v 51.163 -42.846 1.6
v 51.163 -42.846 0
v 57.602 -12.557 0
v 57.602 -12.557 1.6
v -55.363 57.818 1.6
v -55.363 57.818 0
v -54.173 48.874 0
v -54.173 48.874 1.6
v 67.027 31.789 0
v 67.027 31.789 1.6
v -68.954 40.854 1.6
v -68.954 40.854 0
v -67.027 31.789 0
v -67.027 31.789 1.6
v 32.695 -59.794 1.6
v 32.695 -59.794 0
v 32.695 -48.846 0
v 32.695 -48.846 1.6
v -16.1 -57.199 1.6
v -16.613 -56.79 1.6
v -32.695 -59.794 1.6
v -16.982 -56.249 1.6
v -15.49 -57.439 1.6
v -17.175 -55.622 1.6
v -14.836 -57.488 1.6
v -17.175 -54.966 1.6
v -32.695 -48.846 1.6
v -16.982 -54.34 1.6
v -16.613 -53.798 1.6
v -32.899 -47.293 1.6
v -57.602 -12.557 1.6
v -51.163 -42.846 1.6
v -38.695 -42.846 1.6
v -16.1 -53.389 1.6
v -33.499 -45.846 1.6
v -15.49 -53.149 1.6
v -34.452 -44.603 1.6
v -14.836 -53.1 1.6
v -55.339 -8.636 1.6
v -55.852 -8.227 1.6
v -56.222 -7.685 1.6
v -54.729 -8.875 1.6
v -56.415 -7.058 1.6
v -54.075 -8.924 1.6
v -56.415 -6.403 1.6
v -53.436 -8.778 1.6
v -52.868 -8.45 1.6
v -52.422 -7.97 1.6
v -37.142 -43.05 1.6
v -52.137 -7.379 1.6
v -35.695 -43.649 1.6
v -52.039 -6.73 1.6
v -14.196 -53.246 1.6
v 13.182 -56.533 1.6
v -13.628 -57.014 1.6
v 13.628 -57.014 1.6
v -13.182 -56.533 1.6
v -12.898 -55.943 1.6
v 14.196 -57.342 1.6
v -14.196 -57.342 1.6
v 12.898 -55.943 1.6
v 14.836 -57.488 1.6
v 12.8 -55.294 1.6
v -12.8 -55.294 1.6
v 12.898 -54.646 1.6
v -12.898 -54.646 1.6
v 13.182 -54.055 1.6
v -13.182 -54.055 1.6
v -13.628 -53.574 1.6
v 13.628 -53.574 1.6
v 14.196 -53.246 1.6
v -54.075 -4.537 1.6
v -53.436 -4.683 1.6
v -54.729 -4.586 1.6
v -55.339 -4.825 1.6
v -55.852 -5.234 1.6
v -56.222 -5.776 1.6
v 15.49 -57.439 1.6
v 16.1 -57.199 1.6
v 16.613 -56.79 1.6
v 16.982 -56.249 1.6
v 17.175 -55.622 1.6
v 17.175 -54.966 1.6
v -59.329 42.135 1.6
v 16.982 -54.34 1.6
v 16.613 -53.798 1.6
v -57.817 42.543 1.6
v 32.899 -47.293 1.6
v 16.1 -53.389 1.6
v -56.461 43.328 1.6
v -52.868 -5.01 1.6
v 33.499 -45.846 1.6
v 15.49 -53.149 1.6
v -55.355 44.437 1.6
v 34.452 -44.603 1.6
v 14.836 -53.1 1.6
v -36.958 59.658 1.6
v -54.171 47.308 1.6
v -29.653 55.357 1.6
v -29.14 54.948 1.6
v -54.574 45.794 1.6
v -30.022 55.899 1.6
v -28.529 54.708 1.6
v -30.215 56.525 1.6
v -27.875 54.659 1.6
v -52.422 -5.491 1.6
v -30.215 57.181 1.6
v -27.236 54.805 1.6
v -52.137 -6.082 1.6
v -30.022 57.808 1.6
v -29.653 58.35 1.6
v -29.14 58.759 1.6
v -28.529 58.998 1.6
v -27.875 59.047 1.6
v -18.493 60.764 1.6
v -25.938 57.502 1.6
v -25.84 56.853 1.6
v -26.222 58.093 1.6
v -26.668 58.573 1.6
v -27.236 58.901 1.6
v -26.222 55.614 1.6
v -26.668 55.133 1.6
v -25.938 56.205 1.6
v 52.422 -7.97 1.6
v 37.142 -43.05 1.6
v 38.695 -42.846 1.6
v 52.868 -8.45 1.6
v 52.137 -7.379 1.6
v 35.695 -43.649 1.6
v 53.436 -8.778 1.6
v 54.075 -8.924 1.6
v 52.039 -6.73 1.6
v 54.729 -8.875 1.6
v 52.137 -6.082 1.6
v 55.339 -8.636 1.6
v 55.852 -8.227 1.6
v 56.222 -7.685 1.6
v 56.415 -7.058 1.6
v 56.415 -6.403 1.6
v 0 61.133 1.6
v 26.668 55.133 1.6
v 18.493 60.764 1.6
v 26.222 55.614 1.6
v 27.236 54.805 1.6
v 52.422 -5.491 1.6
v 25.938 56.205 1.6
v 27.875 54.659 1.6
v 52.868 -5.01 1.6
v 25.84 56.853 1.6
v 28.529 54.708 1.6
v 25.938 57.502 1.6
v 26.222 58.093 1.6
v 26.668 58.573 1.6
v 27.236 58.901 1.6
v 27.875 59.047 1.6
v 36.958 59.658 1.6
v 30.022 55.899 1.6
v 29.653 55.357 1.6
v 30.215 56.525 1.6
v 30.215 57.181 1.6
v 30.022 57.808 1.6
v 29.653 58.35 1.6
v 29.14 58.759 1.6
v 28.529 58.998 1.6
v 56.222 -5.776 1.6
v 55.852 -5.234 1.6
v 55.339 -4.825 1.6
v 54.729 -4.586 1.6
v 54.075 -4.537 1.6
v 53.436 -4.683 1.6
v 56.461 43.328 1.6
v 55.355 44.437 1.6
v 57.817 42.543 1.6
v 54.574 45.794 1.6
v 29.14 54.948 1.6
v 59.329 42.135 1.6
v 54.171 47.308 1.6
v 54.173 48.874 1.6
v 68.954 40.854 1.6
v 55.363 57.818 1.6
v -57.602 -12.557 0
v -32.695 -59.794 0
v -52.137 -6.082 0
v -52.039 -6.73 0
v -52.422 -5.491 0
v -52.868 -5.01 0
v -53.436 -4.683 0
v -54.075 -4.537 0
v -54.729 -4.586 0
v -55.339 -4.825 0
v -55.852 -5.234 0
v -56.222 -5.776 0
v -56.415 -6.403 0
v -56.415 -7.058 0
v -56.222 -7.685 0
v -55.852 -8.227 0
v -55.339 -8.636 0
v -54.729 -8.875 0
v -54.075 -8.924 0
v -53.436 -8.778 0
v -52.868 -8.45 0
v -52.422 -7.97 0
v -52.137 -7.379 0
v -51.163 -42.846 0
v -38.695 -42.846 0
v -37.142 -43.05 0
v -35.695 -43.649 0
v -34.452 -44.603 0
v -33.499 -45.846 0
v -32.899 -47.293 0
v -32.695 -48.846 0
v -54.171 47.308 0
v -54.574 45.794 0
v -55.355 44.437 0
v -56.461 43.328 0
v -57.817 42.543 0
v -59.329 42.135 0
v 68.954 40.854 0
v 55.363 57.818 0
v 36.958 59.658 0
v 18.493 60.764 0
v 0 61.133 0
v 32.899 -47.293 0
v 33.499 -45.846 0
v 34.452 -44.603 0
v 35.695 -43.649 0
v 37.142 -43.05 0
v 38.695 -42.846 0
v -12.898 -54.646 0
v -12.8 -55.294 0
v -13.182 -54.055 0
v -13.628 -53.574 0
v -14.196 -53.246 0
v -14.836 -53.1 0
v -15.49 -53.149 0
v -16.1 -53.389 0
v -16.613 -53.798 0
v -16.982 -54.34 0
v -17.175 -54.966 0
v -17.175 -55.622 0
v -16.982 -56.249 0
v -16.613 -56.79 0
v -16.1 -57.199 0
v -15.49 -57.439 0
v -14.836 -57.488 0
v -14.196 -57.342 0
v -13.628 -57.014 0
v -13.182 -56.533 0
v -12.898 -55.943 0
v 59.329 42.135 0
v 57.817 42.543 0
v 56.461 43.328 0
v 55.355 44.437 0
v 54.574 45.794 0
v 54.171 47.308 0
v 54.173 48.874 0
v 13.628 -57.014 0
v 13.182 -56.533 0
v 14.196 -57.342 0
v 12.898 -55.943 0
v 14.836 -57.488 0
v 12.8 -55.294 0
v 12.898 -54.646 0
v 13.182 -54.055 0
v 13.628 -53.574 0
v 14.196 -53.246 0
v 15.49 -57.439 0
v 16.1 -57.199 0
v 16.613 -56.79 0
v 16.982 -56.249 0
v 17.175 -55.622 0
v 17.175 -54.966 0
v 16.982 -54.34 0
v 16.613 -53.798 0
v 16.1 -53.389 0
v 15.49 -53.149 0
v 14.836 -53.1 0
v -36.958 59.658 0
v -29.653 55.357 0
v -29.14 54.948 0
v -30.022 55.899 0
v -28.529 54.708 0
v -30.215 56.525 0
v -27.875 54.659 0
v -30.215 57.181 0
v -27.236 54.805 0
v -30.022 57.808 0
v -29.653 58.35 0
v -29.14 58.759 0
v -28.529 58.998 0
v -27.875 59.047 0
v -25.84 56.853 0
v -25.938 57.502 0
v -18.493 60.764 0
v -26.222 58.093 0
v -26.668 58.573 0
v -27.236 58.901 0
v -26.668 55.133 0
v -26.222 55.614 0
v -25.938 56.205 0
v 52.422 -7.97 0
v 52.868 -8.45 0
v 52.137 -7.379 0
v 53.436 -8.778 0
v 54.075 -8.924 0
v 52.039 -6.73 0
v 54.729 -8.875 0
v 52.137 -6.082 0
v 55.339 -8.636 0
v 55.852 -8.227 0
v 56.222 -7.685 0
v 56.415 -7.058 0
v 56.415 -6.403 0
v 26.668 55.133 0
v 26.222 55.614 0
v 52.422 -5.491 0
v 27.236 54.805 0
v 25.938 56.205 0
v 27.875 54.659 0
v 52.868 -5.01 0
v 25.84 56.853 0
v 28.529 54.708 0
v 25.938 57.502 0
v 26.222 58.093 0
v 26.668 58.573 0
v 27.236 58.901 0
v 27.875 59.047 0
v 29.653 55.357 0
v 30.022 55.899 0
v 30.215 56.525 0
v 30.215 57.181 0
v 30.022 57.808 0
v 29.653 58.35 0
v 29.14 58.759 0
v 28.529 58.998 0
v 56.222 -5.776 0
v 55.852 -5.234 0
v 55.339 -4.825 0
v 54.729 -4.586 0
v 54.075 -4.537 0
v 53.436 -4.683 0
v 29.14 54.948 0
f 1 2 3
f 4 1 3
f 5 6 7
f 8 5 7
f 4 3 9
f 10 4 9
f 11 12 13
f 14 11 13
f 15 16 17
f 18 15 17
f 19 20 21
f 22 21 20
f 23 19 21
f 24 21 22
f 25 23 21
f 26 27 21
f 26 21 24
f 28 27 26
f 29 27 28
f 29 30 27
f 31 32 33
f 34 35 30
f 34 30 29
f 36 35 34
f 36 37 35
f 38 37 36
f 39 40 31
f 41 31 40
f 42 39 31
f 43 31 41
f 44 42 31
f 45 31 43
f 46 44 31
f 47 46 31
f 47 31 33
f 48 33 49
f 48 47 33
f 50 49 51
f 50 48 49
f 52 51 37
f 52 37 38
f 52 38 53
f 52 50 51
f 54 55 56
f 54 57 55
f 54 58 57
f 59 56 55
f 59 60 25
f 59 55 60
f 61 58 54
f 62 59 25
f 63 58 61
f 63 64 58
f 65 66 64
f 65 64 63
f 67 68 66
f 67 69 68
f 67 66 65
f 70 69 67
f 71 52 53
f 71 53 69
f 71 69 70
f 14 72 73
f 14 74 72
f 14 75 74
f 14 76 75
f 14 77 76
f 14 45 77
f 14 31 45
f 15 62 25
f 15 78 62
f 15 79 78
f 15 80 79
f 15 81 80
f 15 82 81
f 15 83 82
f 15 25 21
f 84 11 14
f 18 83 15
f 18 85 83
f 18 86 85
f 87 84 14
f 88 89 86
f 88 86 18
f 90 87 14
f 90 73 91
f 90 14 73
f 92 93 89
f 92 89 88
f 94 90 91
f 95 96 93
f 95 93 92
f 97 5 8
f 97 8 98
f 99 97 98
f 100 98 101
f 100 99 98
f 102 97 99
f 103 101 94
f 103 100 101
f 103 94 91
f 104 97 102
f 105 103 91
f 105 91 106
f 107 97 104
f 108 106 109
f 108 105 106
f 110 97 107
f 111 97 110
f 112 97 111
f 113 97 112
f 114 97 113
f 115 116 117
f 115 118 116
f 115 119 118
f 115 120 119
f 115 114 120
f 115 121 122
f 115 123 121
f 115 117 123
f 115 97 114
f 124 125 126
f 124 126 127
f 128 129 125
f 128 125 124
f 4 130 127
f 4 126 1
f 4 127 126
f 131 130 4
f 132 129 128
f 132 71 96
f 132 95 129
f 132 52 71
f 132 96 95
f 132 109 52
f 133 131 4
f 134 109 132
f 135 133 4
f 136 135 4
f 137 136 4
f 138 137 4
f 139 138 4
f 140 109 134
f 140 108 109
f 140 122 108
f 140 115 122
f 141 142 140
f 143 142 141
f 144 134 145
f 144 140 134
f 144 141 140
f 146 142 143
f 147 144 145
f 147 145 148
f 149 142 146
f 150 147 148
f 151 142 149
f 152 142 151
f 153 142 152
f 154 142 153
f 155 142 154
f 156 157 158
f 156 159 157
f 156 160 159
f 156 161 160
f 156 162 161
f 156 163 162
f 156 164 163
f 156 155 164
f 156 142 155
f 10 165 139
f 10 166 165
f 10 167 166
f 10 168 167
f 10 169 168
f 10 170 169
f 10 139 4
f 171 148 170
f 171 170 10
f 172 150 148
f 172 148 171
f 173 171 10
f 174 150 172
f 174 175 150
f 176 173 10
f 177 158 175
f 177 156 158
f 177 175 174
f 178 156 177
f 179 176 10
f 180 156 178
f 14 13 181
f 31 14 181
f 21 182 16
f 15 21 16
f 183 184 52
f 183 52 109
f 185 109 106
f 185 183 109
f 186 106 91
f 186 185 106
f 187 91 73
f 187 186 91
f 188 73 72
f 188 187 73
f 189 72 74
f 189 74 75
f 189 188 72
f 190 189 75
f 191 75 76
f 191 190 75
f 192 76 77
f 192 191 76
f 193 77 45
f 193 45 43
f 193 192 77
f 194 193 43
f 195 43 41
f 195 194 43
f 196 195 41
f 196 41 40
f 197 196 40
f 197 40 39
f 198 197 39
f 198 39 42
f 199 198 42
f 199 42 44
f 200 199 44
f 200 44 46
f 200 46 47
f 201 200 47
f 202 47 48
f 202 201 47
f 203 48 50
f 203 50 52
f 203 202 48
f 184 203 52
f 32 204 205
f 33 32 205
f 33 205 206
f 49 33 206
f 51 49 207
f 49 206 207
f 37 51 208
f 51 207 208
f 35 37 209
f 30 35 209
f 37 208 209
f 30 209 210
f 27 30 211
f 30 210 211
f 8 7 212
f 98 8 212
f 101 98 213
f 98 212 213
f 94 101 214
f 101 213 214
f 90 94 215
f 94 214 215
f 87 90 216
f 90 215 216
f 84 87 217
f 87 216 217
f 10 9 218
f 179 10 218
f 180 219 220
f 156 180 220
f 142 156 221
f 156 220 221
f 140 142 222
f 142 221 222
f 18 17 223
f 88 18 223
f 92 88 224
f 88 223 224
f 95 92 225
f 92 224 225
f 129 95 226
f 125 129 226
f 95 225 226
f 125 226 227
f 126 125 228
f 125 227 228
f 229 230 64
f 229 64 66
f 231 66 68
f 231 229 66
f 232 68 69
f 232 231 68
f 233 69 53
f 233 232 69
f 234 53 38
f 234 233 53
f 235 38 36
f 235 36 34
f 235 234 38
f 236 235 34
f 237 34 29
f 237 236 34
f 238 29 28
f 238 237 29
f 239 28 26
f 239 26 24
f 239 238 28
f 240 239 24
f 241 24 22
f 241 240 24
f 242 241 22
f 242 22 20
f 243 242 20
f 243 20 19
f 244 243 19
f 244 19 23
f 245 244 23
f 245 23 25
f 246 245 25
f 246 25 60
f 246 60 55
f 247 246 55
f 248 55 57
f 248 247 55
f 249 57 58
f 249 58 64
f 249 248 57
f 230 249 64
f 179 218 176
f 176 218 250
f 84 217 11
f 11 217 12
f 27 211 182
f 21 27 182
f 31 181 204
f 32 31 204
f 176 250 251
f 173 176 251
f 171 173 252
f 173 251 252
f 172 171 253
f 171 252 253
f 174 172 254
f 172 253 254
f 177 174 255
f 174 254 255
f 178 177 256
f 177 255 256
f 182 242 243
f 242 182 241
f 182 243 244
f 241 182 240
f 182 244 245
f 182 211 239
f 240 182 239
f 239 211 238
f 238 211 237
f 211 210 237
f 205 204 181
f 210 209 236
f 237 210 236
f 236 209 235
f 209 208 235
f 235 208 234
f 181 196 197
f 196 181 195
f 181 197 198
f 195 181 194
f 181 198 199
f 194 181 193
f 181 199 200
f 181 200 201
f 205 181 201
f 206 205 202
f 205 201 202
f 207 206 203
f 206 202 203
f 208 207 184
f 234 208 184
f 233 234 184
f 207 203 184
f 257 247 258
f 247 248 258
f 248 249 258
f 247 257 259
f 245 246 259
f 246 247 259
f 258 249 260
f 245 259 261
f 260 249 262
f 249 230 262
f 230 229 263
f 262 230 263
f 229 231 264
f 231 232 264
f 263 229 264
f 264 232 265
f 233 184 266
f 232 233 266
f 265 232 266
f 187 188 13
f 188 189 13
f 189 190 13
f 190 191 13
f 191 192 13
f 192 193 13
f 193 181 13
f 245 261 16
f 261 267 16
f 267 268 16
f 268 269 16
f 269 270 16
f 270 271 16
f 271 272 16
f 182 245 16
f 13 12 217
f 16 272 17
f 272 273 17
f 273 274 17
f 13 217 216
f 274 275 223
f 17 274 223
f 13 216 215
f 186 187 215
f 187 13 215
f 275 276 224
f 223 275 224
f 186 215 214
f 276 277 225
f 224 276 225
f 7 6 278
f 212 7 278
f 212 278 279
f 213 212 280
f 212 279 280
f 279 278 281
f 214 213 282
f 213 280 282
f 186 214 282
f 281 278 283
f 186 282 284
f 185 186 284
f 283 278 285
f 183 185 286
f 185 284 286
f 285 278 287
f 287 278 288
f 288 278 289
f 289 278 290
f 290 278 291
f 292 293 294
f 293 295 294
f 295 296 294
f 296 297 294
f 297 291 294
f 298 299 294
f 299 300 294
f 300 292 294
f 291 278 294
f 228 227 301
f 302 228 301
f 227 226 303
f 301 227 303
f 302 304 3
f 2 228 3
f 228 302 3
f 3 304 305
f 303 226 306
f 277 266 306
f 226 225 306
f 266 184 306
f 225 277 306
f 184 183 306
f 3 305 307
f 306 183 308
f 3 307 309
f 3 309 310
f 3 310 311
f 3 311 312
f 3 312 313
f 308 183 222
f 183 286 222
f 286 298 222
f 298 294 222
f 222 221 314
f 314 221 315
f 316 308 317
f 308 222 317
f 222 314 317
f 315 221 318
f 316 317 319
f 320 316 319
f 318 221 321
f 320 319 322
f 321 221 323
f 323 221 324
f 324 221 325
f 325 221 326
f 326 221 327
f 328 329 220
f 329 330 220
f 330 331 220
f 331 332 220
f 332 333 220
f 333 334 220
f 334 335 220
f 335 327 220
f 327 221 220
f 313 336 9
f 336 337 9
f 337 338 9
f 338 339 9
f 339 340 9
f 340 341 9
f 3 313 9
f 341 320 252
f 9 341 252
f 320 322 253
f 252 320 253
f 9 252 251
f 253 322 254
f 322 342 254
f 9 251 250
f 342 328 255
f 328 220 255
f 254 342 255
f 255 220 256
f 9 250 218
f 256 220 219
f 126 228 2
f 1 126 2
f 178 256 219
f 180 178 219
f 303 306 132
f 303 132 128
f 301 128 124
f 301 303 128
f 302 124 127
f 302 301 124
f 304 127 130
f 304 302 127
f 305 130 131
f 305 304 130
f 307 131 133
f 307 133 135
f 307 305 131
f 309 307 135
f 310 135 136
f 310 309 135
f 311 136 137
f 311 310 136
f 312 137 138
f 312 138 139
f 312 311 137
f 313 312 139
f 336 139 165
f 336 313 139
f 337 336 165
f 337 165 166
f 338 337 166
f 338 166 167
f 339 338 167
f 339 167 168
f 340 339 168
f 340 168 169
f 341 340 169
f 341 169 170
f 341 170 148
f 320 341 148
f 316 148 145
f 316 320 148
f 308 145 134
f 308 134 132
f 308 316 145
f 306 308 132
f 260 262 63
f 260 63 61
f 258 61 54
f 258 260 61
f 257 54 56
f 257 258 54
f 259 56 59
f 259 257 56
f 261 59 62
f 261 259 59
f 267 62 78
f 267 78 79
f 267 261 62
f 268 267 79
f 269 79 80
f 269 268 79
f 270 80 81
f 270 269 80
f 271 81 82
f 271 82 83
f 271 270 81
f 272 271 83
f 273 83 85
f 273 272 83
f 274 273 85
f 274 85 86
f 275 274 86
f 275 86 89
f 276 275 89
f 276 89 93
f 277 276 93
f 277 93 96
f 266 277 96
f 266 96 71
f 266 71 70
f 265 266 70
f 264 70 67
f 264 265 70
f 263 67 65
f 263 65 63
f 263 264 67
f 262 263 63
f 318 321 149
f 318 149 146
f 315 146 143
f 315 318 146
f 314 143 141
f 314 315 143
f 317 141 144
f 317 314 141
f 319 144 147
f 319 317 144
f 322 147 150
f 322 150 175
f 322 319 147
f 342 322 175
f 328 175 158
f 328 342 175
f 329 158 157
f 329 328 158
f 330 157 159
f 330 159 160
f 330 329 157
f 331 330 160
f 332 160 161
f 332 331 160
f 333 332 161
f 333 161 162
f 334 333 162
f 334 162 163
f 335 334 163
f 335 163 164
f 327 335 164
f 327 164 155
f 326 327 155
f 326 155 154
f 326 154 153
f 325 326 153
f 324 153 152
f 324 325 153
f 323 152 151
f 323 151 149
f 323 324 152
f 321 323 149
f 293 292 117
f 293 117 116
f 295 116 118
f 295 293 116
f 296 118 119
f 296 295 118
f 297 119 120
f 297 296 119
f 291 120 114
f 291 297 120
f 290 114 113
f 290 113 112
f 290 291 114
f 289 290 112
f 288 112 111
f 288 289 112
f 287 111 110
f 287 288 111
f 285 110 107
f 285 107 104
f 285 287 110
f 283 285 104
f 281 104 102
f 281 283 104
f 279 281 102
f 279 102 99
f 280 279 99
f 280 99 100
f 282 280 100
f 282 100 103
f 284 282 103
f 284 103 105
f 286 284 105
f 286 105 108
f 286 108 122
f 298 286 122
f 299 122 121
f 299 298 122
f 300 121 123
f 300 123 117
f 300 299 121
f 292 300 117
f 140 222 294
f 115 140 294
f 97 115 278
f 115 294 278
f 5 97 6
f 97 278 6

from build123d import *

# Parameters (mm, degrees)
SKETCH1_R           = 2.2
BOSS_EXTRUDE1_DEPTH = 1.6


with BuildPart() as part:
    # Sketch1 → Boss-Extrude1 (new body)
    with BuildSketch(Plane.XY):
        with BuildLine():
            Line((-55.362831431, 57.817815724), (-54.172884307, 48.873950258))
            ThreePointArc((-54.172884307, 48.873950258), (-55.355356756, 44.436600749), (-59.329170971, 42.135055108))
            Line((-59.329170971, 42.135055108), (-68.954453082, 40.854448103))
            Line((-68.954453082, 40.854448103), (-67.027453941, 31.788629925))
            Line((-67.027453941, 31.788629925), (-57.601548228, -12.556769902))
            Line((-57.601548228, -12.556769902), (-51.163468122, -42.845555417))
            Line((-51.163468122, -42.845555417), (-38.694980354, -42.845555417))
            ThreePointArc((-38.694980354, -42.845555417), (-34.452339666, -44.60291473), (-32.694980354, -48.845555417))
            Line((-32.694980354, -48.845555417), (-32.694980354, -59.794106668))
            Line((-32.694980354, -59.794106668), (-20, -59.794106668))
            Line((-20, -59.794106668), (0, -59.794106668))
            Line((0, -59.794106668), (20, -59.794106668))
            Line((20, -59.794106668), (32.694980354, -59.794106668))
            Line((32.694980354, -59.794106668), (32.694980354, -48.845555417))
            ThreePointArc((32.694980354, -48.845555417), (34.452339666, -44.60291473), (38.694980354, -42.845555417))
            Line((38.694980354, -42.845555417), (51.163468122, -42.845555417))
            Line((51.163468122, -42.845555417), (57.601548228, -12.556769902))
            Line((57.601548228, -12.556769902), (67.027453941, 31.788629925))
            Line((67.027453941, 31.788629925), (68.954453082, 40.854448103))
            Line((68.954453082, 40.854448103), (59.329170971, 42.135055108))
            ThreePointArc((59.329170971, 42.135055108), (55.355356756, 44.436600749), (54.172884307, 48.873950258))
            Line((54.172884307, 48.873950258), (55.362831431, 57.817815724))
            ThreePointArc((55.362831431, 57.817815724), (27.730985644, 60.303090258), (0, 61.132503503))
            ThreePointArc((0, 61.132503503), (-27.730985644, 60.303090258), (-55.362831431, 57.817815724))
        make_face()
        with Locations((-28.039843587, 56.853282526)):
            Circle(SKETCH1_R, mode=Mode.SUBTRACT)
        with Locations((-54.239442479, -6.730429289)):
            Circle(SKETCH1_R, mode=Mode.SUBTRACT)
        with Locations((-15, -55.294106668)):
            Circle(SKETCH1_R, mode=Mode.SUBTRACT)
        with Locations(Location((15, -55.294106668, 0), (0, 0, 180))):
            Circle(SKETCH1_R, mode=Mode.SUBTRACT)
        with Locations(Location((54.239442479, -6.730429289, 0), (0, 0, 180))):
            Circle(SKETCH1_R, mode=Mode.SUBTRACT)
        with Locations(Location((28.039843587, 56.853282526, 0), (0, 0, 180))):
            Circle(SKETCH1_R, mode=Mode.SUBTRACT)
    extrude(amount=BOSS_EXTRUDE1_DEPTH)


solid = part.part
